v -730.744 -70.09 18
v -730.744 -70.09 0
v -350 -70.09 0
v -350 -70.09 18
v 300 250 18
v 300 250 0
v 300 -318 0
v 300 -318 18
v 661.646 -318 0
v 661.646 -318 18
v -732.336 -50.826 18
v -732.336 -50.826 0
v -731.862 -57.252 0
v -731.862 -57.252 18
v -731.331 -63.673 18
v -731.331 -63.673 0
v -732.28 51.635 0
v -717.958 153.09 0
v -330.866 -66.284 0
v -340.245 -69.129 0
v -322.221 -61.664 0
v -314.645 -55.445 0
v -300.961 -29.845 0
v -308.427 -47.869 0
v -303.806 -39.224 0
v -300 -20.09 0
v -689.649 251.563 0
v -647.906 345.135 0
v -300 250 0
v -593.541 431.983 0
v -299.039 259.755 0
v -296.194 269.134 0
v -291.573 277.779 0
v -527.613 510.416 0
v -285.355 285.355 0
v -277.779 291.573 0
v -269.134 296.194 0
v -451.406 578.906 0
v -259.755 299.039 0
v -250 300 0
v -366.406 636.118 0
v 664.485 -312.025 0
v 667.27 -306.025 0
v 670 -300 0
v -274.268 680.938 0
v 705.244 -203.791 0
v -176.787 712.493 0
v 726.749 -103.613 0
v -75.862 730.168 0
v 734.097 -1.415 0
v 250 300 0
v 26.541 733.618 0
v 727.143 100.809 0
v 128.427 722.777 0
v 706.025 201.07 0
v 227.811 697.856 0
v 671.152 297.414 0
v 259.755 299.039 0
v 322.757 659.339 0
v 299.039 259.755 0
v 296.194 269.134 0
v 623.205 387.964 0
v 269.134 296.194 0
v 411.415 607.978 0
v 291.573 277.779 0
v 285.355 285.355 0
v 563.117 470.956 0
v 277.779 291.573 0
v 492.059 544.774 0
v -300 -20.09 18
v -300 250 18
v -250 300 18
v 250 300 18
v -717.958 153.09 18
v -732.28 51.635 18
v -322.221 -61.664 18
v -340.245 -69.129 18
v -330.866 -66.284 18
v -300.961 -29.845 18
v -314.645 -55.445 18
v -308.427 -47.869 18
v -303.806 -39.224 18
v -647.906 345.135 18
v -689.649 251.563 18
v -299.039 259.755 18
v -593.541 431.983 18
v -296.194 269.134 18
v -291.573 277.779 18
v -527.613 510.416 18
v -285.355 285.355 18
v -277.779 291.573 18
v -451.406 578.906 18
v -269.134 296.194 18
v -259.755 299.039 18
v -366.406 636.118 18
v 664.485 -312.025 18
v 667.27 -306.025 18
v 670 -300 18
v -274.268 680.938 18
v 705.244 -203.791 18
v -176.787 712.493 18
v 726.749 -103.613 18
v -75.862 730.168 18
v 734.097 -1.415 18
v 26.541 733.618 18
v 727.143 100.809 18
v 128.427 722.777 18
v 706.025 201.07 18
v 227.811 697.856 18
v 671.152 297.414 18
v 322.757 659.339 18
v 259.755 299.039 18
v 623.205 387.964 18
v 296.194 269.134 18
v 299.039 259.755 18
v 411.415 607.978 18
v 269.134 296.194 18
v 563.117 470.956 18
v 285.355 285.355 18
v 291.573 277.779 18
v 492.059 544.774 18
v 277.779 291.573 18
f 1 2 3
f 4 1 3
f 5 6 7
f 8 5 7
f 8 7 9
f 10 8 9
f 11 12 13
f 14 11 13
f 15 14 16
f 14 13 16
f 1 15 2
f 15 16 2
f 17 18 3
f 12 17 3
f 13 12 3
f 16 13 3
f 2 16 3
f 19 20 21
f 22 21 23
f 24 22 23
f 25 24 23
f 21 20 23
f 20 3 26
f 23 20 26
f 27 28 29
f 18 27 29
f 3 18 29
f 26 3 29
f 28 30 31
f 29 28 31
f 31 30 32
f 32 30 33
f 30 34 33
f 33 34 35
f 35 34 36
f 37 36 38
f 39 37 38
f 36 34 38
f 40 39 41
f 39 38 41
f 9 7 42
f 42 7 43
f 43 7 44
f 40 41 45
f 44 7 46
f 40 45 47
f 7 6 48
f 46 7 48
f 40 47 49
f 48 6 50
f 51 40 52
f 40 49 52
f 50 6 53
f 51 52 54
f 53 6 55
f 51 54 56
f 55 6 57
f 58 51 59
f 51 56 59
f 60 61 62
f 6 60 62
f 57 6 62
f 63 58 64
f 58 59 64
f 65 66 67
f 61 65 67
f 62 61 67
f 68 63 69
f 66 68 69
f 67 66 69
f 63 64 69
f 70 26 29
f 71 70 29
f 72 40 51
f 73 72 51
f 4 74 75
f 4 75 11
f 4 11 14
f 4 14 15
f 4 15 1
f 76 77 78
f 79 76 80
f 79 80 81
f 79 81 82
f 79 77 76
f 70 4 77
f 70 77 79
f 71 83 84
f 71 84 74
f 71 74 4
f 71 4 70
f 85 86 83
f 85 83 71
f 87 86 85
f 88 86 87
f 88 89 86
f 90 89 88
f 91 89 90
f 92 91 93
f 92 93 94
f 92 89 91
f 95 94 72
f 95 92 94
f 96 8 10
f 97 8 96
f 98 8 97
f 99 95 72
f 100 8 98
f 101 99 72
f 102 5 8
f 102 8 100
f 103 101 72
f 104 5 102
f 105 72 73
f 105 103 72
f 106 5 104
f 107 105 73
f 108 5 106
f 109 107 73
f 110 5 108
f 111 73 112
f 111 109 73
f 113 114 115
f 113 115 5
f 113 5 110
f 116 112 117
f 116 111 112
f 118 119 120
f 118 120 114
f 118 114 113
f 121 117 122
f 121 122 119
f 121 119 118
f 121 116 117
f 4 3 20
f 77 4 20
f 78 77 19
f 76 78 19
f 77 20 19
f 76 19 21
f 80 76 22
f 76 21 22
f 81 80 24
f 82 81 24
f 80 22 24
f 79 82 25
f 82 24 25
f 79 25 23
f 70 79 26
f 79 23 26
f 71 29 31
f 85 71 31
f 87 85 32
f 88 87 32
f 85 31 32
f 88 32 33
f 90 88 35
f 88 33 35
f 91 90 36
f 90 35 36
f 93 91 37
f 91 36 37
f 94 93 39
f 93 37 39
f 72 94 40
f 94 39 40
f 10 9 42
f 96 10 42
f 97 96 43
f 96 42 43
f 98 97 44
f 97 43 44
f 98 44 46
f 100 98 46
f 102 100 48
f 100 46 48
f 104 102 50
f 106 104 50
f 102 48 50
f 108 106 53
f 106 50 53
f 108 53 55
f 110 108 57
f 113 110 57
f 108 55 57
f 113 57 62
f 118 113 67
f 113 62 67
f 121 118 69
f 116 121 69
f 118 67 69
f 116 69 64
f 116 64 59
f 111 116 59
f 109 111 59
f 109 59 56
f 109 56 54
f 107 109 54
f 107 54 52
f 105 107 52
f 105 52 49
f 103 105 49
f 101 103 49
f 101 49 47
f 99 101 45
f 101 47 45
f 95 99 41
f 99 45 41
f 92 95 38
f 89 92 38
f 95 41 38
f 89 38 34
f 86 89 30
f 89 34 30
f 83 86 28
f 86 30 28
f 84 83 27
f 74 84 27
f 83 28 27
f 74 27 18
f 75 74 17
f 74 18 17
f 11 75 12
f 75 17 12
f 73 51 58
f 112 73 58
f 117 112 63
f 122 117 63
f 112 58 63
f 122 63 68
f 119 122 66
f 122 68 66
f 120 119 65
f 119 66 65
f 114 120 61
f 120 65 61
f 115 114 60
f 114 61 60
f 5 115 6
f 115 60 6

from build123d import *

# Parameters (mm, degrees)
F1_DEPTH = 18


with BuildPart() as f1:
    # F0 (on Top) → F1 (new body)
    with BuildSketch(Plane.XY):
        with BuildLine():
            ThreePointArc((-300, 250), (-285.355339, 285.355339), (-250, 300))
            Line((-250, 300), (250, 300))
            ThreePointArc((250, 300), (285.355339, 285.355339), (300, 250))
            Line((300, 250), (300, -300))
            Line((300, -300), (300, -318))
            Line((300, -318), (661.646431, -318))
            ThreePointArc((661.646431, -318), (665.88404, -309.028228), (670, -300))
            ThreePointArc((670, -300), (128.426587, 722.777014), (-732.336483, -50.825933))
            ThreePointArc((-732.336483, -50.825933), (-731.603853, -60.463233), (-730.744404, -70.090053))
            Line((-730.744404, -70.090053), (-350, -70.090053))
            ThreePointArc((-350, -70.090053), (-314.644661, -55.445392), (-300, -20.090053))
            Line((-300, -20.090053), (-300, -2.090053))
            Line((-300, -2.090053), (-300, 250))
        make_face()
    extrude(amount=F1_DEPTH)


solid = f1.part
